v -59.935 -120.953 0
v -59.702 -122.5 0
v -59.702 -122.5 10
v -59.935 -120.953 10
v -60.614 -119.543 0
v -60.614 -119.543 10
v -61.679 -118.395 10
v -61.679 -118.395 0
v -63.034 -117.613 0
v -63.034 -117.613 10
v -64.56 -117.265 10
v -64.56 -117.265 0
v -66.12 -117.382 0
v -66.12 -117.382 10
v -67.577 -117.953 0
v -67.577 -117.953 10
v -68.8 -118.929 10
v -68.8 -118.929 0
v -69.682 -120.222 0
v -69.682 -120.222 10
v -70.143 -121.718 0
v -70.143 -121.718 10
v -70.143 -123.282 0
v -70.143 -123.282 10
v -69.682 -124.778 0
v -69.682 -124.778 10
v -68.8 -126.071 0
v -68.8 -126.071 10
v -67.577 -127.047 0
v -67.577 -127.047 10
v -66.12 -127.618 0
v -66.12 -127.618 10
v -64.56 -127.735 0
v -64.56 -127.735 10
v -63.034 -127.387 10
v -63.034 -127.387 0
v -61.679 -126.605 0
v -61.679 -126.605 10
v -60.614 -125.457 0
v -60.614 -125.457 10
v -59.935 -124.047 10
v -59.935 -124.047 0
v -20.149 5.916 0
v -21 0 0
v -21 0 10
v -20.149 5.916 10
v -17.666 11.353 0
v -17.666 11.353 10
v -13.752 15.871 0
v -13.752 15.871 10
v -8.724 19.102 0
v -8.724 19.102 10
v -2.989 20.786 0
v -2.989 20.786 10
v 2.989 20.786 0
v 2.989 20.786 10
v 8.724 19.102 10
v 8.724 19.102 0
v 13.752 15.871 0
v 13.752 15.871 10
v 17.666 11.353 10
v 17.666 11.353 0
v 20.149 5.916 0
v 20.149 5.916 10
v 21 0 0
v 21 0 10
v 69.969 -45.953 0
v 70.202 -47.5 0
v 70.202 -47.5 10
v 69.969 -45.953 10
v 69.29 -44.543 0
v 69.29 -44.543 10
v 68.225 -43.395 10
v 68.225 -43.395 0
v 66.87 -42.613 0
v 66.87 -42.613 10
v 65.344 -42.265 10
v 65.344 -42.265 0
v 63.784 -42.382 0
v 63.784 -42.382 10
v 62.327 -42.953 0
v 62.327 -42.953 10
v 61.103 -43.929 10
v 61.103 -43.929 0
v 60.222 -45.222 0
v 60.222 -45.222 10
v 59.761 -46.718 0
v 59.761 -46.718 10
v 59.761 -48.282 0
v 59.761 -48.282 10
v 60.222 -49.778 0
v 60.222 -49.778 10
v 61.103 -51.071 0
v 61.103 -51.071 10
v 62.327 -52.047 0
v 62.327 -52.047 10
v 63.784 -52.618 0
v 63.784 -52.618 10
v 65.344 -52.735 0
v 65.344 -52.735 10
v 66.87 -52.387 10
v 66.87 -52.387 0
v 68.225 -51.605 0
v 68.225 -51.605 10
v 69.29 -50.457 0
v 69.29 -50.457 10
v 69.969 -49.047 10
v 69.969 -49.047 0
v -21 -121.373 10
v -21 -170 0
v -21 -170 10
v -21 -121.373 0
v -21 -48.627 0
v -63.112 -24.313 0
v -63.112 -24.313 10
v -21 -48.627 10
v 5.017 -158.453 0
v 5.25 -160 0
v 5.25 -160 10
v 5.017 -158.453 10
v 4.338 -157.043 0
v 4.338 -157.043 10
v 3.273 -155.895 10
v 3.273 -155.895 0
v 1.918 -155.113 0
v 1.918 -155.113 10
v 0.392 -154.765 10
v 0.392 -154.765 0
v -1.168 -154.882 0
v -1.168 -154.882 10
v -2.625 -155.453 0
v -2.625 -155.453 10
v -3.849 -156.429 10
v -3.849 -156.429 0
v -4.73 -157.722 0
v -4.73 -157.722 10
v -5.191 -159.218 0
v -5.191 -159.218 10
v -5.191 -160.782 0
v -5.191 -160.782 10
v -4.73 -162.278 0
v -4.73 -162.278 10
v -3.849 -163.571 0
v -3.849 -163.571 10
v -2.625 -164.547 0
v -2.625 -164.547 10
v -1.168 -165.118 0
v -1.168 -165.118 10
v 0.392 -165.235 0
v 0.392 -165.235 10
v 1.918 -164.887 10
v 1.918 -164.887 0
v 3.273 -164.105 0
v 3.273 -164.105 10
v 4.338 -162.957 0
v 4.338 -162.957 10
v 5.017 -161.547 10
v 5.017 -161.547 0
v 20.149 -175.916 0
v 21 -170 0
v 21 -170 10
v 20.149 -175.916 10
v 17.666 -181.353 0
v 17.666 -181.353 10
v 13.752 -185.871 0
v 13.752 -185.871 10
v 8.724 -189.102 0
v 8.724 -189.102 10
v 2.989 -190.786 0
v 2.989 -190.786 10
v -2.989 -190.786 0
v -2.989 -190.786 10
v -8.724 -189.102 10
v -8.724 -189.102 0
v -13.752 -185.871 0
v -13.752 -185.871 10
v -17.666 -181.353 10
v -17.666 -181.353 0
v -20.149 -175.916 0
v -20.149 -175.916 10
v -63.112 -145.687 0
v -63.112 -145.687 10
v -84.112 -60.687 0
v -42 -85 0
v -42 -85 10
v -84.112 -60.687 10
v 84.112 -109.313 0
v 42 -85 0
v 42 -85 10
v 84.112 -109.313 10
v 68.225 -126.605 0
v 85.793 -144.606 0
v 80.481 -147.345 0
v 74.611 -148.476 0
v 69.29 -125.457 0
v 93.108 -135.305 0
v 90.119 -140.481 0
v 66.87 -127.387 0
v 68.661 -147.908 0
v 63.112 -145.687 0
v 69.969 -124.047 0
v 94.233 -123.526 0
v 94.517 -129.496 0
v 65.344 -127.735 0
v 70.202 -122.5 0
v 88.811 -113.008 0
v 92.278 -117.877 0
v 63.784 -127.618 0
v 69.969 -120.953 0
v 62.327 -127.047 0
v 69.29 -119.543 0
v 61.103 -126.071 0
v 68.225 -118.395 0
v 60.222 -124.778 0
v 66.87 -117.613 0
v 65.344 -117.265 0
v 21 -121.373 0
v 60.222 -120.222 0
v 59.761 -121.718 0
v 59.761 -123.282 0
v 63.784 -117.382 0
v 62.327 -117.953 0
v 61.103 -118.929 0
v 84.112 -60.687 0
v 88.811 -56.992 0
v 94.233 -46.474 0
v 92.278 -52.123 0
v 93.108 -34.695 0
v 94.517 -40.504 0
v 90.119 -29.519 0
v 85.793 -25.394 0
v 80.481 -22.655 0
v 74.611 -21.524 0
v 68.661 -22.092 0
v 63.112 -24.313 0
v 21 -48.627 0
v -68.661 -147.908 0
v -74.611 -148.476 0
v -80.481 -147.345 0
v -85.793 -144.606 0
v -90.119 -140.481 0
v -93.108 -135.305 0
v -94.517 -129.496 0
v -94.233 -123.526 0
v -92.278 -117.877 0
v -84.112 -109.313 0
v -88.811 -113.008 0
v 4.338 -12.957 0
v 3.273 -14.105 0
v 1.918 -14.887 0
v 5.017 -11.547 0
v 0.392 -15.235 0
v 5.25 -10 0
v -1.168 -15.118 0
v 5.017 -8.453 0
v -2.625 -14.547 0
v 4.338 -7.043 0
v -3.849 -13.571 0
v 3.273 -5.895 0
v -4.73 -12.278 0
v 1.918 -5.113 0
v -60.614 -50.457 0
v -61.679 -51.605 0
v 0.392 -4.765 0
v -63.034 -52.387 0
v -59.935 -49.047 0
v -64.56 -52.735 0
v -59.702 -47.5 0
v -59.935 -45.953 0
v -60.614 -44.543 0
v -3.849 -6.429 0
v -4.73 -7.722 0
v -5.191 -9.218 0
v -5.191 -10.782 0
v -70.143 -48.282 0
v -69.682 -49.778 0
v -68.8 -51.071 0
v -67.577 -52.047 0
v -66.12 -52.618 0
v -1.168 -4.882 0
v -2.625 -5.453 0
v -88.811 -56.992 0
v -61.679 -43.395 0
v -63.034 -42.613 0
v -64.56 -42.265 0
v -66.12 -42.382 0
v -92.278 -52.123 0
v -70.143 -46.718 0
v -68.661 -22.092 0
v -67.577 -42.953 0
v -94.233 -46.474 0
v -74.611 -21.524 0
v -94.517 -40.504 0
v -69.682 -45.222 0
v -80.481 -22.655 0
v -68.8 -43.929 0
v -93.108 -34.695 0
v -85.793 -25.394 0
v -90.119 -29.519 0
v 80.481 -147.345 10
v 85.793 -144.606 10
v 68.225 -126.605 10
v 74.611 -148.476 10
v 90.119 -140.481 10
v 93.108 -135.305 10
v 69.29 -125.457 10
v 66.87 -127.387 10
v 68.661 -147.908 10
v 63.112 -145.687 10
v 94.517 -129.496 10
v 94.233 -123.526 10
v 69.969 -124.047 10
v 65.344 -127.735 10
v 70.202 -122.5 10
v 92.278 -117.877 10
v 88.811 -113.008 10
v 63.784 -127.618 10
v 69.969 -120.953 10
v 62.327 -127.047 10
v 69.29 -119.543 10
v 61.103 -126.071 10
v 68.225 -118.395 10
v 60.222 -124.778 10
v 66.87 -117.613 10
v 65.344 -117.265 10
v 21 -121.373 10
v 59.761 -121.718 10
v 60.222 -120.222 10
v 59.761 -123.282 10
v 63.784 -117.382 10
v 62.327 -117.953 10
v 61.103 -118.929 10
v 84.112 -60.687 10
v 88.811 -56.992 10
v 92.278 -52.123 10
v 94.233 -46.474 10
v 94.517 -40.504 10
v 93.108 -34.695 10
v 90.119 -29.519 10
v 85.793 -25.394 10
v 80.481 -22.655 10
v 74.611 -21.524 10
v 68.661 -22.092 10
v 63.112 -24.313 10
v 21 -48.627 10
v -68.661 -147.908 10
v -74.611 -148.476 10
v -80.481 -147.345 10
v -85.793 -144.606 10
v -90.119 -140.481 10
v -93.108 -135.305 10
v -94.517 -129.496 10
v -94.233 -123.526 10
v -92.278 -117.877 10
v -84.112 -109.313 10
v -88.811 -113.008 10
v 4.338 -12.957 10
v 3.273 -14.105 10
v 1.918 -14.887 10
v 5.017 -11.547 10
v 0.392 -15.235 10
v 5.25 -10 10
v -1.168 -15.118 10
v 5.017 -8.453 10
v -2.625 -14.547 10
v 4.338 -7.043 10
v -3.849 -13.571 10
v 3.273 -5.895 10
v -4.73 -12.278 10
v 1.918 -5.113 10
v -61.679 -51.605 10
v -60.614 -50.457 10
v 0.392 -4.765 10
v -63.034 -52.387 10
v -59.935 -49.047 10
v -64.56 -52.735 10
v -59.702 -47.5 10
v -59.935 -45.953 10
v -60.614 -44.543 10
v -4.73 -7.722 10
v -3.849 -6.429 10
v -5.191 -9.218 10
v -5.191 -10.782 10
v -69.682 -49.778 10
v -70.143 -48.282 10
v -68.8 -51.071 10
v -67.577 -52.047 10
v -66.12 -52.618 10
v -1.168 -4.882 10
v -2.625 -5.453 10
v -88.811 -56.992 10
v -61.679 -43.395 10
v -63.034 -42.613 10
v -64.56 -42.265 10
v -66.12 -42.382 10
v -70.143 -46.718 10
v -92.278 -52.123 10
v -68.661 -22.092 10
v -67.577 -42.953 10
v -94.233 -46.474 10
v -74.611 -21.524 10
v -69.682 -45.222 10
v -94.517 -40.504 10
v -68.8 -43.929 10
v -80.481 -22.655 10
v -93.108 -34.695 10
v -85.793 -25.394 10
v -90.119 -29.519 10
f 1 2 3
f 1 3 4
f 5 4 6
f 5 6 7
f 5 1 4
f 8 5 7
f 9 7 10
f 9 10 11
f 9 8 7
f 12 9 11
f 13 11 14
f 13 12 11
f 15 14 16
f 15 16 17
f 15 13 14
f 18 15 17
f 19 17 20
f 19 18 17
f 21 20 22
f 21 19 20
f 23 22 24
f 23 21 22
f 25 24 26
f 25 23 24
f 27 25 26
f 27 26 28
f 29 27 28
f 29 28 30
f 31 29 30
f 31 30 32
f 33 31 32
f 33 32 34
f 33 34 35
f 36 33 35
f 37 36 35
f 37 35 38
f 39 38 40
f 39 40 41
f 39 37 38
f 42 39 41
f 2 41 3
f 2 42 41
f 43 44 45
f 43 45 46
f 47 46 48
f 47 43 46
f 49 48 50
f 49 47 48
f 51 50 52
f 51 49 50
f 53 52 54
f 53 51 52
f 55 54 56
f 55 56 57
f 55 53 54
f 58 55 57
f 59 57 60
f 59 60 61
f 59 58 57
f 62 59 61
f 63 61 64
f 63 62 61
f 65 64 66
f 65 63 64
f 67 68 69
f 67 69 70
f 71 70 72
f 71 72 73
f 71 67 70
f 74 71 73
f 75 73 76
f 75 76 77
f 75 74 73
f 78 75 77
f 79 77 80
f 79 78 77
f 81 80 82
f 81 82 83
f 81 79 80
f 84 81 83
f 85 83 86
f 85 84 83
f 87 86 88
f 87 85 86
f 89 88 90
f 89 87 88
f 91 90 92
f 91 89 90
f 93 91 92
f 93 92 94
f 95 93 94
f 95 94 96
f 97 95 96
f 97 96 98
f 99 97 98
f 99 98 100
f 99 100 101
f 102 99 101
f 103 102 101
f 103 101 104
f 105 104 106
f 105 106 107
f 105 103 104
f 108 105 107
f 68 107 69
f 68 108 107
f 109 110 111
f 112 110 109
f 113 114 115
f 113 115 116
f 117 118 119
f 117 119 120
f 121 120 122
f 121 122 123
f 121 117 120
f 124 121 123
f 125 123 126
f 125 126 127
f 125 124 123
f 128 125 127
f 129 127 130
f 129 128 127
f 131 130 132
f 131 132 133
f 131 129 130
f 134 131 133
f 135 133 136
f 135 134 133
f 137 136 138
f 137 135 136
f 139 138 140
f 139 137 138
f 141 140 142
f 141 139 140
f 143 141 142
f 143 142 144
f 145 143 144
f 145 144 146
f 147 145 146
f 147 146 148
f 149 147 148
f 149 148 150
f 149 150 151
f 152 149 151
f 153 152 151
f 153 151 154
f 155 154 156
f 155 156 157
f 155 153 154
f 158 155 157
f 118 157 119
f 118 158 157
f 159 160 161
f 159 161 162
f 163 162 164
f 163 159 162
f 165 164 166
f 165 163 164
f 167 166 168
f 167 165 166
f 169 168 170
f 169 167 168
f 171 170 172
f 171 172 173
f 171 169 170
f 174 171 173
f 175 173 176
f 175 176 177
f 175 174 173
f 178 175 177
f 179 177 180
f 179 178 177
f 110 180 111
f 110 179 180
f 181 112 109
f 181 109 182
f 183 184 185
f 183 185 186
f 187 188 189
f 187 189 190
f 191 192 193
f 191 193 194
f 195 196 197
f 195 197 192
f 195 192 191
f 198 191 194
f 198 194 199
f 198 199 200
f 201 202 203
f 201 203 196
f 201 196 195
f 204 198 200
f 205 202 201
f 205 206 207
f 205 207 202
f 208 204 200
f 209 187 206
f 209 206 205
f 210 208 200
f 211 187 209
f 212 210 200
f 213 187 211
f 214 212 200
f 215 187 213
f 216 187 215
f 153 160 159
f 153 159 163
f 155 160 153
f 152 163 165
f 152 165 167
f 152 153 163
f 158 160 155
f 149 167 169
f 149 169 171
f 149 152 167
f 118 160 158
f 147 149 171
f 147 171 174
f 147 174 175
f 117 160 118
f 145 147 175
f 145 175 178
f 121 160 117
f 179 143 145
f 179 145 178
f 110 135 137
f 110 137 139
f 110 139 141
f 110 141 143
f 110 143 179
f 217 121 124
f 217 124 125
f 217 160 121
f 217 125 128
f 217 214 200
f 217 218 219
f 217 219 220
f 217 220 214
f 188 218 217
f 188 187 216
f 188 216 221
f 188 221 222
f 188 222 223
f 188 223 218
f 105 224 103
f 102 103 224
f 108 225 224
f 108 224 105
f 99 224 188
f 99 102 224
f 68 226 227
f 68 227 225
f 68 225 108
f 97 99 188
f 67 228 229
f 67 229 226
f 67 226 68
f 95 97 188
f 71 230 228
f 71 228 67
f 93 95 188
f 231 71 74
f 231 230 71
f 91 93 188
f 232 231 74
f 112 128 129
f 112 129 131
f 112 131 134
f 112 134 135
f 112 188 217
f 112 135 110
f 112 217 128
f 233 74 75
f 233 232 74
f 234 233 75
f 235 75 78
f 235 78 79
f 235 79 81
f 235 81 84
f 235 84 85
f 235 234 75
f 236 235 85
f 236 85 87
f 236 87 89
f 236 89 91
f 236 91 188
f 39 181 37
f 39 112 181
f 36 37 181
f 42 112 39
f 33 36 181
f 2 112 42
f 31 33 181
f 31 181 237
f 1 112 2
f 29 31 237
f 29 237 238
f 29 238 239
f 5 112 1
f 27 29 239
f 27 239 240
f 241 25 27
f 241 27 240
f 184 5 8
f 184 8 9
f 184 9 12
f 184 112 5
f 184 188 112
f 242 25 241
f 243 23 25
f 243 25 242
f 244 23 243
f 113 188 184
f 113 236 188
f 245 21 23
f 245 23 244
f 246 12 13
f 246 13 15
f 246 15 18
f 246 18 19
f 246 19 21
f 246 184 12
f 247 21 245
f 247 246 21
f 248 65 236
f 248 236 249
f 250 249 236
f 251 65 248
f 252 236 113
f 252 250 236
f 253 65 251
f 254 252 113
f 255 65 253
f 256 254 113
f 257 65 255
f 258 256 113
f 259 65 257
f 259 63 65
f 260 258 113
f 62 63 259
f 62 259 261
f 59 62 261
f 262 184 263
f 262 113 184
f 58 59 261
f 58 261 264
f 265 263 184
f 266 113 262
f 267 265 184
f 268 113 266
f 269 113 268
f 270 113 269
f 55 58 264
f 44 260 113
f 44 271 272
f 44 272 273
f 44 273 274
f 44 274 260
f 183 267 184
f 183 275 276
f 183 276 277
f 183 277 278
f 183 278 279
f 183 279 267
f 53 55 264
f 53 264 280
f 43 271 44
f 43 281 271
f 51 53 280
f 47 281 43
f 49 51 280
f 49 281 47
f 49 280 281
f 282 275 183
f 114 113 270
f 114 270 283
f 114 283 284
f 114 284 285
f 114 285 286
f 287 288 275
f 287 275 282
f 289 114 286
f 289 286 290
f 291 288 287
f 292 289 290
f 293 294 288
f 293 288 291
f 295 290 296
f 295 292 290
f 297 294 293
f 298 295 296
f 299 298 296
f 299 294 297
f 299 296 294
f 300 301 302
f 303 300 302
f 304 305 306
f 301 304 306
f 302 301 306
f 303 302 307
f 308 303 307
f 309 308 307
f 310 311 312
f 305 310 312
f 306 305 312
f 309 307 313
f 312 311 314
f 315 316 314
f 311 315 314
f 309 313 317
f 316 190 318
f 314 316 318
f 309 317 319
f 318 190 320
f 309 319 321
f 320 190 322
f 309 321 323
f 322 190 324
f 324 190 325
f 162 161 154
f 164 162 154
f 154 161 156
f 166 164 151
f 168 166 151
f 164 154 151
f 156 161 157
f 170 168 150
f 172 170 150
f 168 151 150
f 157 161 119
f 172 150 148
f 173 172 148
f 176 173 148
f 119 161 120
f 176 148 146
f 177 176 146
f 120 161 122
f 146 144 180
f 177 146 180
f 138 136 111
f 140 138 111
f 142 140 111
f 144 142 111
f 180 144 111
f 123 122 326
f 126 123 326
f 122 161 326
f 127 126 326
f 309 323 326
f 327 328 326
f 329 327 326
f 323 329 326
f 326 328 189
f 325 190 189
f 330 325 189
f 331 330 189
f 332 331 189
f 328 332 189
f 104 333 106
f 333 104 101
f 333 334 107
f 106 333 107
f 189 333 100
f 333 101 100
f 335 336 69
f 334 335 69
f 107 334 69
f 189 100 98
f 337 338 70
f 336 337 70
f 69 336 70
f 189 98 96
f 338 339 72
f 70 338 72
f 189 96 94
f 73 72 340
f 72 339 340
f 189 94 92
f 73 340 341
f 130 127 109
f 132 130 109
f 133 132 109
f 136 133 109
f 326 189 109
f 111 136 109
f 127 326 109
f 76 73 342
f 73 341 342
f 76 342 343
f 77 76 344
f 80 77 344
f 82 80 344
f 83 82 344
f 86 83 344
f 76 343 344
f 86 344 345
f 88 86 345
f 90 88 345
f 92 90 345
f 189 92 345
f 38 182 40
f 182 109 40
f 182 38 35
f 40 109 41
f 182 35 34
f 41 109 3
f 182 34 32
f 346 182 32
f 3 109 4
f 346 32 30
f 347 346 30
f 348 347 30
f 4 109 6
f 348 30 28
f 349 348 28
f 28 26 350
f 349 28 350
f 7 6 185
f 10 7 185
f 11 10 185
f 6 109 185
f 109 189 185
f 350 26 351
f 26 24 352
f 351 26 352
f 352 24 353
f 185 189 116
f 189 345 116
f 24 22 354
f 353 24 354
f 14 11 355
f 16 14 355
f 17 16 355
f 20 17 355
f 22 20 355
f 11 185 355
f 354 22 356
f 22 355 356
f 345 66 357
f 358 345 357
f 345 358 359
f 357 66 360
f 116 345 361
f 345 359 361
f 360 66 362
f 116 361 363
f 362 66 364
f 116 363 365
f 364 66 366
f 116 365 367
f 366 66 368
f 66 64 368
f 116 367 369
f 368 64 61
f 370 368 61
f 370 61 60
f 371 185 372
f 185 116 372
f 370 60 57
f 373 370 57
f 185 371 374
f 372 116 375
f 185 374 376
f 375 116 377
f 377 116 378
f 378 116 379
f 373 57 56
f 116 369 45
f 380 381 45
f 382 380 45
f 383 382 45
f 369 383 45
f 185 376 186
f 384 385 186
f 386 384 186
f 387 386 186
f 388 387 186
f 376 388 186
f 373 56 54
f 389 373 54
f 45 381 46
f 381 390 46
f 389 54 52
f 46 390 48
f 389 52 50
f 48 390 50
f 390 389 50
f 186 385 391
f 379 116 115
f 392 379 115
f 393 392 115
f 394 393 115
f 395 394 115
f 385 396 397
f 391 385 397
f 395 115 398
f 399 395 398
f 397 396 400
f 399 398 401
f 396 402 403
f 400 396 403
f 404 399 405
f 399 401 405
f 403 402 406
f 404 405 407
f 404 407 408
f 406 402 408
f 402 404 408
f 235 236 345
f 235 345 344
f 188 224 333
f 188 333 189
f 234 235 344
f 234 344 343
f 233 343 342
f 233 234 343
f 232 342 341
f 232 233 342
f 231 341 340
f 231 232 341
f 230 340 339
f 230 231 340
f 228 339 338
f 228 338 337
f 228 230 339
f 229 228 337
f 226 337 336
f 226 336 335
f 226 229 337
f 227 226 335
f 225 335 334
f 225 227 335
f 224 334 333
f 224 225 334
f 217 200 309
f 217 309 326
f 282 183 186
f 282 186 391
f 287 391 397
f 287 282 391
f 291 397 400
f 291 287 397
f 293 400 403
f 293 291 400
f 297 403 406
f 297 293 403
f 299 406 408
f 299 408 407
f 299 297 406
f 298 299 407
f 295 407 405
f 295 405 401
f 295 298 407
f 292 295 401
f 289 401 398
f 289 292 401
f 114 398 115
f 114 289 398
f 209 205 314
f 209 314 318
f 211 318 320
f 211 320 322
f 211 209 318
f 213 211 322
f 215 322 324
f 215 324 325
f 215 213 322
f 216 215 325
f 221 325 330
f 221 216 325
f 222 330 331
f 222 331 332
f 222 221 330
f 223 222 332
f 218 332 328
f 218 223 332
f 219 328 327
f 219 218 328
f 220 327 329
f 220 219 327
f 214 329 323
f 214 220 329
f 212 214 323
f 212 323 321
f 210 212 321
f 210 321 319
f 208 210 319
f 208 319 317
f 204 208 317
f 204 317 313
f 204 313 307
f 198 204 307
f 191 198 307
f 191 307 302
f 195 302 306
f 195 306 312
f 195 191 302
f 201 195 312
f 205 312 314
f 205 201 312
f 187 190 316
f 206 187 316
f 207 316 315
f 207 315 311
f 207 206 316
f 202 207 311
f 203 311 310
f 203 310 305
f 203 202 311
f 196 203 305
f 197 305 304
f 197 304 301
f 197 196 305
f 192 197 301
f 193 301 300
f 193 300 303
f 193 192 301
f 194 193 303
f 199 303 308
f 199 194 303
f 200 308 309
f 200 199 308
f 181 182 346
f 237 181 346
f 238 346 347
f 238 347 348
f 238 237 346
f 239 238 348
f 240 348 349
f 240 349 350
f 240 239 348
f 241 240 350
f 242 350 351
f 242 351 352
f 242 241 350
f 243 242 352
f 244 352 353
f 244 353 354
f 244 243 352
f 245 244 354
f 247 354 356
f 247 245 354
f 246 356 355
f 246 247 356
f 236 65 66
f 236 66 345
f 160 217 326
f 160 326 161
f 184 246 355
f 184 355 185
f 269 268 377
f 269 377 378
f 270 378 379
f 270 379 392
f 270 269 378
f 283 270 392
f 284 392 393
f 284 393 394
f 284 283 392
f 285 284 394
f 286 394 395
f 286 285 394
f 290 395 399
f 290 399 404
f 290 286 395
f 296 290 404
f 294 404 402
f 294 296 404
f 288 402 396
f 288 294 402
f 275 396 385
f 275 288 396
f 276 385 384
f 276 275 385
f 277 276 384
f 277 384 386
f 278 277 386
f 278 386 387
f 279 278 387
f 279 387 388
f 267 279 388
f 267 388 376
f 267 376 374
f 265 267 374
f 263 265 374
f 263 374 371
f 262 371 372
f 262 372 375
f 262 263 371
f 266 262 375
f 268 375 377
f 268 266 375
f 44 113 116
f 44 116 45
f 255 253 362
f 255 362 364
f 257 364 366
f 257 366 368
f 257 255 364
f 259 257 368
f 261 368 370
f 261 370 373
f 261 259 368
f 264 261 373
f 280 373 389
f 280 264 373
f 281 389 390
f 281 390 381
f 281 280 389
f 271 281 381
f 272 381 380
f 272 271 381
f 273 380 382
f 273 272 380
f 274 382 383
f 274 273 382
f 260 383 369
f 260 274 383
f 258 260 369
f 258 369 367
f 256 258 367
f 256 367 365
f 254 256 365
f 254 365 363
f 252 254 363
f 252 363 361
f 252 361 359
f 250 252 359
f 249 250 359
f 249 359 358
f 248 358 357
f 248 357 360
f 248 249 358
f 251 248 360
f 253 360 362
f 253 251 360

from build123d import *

# Parameters (mm, degrees)
SKETCH_1_R      = 5.25
EXTRUDE_1_DEPTH = 10


with BuildPart() as part:
    # 草图1 → 凸台-拉伸1 (new body)
    with BuildSketch(Plane.XY):
        with BuildLine():
            Line((21, 0), (21, -48.626933041))
            Line((21, -48.626933041), (63.112159322, -24.313466521))
            ThreePointArc((63.112159322, -24.313466521), (91.798692801, -32), (84.112159322, -60.686533479))
            Line((84.112159322, -60.686533479), (42, -85))
            Line((42, -85), (84.112159322, -109.313466521))
            ThreePointArc((84.112159322, -109.313466521), (91.798692801, -138), (63.112159322, -145.686533479))
            Line((63.112159322, -145.686533479), (21, -121.373066959))
            Line((21, -121.373066959), (21, -170))
            ThreePointArc((21, -170), (0, -191), (-21, -170))
            Line((-21, -170), (-21, -121.373066959))
            Line((-21, -121.373066959), (-63.112159322, -145.686533479))
            ThreePointArc((-63.112159322, -145.686533479), (-91.798692801, -138), (-84.112159322, -109.313466521))
            Line((-84.112159322, -109.313466521), (-42, -85))
            Line((-42, -85), (-84.112159322, -60.686533479))
            ThreePointArc((-84.112159322, -60.686533479), (-91.798692801, -32), (-63.112159322, -24.313466521))
            Line((-63.112159322, -24.313466521), (-21, -48.626933041))
            Line((-21, -48.626933041), (-21, 0))
            ThreePointArc((-21, 0), (0, 21), (21, 0))
        make_face()
        with Locations((0, -10)):
            Circle(SKETCH_1_R, mode=Mode.SUBTRACT)
        with Locations((64.951905284, -47.5)):
            Circle(SKETCH_1_R, mode=Mode.SUBTRACT)
        with Locations((64.951905284, -122.5)):
            Circle(SKETCH_1_R, mode=Mode.SUBTRACT)
        with Locations((0, -160)):
            Circle(SKETCH_1_R, mode=Mode.SUBTRACT)
        with Locations((-64.951905284, -122.5)):
            Circle(SKETCH_1_R, mode=Mode.SUBTRACT)
        with Locations((-64.951905284, -47.5)):
            Circle(SKETCH_1_R, mode=Mode.SUBTRACT)
    extrude(amount=EXTRUDE_1_DEPTH)


solid = part.part
